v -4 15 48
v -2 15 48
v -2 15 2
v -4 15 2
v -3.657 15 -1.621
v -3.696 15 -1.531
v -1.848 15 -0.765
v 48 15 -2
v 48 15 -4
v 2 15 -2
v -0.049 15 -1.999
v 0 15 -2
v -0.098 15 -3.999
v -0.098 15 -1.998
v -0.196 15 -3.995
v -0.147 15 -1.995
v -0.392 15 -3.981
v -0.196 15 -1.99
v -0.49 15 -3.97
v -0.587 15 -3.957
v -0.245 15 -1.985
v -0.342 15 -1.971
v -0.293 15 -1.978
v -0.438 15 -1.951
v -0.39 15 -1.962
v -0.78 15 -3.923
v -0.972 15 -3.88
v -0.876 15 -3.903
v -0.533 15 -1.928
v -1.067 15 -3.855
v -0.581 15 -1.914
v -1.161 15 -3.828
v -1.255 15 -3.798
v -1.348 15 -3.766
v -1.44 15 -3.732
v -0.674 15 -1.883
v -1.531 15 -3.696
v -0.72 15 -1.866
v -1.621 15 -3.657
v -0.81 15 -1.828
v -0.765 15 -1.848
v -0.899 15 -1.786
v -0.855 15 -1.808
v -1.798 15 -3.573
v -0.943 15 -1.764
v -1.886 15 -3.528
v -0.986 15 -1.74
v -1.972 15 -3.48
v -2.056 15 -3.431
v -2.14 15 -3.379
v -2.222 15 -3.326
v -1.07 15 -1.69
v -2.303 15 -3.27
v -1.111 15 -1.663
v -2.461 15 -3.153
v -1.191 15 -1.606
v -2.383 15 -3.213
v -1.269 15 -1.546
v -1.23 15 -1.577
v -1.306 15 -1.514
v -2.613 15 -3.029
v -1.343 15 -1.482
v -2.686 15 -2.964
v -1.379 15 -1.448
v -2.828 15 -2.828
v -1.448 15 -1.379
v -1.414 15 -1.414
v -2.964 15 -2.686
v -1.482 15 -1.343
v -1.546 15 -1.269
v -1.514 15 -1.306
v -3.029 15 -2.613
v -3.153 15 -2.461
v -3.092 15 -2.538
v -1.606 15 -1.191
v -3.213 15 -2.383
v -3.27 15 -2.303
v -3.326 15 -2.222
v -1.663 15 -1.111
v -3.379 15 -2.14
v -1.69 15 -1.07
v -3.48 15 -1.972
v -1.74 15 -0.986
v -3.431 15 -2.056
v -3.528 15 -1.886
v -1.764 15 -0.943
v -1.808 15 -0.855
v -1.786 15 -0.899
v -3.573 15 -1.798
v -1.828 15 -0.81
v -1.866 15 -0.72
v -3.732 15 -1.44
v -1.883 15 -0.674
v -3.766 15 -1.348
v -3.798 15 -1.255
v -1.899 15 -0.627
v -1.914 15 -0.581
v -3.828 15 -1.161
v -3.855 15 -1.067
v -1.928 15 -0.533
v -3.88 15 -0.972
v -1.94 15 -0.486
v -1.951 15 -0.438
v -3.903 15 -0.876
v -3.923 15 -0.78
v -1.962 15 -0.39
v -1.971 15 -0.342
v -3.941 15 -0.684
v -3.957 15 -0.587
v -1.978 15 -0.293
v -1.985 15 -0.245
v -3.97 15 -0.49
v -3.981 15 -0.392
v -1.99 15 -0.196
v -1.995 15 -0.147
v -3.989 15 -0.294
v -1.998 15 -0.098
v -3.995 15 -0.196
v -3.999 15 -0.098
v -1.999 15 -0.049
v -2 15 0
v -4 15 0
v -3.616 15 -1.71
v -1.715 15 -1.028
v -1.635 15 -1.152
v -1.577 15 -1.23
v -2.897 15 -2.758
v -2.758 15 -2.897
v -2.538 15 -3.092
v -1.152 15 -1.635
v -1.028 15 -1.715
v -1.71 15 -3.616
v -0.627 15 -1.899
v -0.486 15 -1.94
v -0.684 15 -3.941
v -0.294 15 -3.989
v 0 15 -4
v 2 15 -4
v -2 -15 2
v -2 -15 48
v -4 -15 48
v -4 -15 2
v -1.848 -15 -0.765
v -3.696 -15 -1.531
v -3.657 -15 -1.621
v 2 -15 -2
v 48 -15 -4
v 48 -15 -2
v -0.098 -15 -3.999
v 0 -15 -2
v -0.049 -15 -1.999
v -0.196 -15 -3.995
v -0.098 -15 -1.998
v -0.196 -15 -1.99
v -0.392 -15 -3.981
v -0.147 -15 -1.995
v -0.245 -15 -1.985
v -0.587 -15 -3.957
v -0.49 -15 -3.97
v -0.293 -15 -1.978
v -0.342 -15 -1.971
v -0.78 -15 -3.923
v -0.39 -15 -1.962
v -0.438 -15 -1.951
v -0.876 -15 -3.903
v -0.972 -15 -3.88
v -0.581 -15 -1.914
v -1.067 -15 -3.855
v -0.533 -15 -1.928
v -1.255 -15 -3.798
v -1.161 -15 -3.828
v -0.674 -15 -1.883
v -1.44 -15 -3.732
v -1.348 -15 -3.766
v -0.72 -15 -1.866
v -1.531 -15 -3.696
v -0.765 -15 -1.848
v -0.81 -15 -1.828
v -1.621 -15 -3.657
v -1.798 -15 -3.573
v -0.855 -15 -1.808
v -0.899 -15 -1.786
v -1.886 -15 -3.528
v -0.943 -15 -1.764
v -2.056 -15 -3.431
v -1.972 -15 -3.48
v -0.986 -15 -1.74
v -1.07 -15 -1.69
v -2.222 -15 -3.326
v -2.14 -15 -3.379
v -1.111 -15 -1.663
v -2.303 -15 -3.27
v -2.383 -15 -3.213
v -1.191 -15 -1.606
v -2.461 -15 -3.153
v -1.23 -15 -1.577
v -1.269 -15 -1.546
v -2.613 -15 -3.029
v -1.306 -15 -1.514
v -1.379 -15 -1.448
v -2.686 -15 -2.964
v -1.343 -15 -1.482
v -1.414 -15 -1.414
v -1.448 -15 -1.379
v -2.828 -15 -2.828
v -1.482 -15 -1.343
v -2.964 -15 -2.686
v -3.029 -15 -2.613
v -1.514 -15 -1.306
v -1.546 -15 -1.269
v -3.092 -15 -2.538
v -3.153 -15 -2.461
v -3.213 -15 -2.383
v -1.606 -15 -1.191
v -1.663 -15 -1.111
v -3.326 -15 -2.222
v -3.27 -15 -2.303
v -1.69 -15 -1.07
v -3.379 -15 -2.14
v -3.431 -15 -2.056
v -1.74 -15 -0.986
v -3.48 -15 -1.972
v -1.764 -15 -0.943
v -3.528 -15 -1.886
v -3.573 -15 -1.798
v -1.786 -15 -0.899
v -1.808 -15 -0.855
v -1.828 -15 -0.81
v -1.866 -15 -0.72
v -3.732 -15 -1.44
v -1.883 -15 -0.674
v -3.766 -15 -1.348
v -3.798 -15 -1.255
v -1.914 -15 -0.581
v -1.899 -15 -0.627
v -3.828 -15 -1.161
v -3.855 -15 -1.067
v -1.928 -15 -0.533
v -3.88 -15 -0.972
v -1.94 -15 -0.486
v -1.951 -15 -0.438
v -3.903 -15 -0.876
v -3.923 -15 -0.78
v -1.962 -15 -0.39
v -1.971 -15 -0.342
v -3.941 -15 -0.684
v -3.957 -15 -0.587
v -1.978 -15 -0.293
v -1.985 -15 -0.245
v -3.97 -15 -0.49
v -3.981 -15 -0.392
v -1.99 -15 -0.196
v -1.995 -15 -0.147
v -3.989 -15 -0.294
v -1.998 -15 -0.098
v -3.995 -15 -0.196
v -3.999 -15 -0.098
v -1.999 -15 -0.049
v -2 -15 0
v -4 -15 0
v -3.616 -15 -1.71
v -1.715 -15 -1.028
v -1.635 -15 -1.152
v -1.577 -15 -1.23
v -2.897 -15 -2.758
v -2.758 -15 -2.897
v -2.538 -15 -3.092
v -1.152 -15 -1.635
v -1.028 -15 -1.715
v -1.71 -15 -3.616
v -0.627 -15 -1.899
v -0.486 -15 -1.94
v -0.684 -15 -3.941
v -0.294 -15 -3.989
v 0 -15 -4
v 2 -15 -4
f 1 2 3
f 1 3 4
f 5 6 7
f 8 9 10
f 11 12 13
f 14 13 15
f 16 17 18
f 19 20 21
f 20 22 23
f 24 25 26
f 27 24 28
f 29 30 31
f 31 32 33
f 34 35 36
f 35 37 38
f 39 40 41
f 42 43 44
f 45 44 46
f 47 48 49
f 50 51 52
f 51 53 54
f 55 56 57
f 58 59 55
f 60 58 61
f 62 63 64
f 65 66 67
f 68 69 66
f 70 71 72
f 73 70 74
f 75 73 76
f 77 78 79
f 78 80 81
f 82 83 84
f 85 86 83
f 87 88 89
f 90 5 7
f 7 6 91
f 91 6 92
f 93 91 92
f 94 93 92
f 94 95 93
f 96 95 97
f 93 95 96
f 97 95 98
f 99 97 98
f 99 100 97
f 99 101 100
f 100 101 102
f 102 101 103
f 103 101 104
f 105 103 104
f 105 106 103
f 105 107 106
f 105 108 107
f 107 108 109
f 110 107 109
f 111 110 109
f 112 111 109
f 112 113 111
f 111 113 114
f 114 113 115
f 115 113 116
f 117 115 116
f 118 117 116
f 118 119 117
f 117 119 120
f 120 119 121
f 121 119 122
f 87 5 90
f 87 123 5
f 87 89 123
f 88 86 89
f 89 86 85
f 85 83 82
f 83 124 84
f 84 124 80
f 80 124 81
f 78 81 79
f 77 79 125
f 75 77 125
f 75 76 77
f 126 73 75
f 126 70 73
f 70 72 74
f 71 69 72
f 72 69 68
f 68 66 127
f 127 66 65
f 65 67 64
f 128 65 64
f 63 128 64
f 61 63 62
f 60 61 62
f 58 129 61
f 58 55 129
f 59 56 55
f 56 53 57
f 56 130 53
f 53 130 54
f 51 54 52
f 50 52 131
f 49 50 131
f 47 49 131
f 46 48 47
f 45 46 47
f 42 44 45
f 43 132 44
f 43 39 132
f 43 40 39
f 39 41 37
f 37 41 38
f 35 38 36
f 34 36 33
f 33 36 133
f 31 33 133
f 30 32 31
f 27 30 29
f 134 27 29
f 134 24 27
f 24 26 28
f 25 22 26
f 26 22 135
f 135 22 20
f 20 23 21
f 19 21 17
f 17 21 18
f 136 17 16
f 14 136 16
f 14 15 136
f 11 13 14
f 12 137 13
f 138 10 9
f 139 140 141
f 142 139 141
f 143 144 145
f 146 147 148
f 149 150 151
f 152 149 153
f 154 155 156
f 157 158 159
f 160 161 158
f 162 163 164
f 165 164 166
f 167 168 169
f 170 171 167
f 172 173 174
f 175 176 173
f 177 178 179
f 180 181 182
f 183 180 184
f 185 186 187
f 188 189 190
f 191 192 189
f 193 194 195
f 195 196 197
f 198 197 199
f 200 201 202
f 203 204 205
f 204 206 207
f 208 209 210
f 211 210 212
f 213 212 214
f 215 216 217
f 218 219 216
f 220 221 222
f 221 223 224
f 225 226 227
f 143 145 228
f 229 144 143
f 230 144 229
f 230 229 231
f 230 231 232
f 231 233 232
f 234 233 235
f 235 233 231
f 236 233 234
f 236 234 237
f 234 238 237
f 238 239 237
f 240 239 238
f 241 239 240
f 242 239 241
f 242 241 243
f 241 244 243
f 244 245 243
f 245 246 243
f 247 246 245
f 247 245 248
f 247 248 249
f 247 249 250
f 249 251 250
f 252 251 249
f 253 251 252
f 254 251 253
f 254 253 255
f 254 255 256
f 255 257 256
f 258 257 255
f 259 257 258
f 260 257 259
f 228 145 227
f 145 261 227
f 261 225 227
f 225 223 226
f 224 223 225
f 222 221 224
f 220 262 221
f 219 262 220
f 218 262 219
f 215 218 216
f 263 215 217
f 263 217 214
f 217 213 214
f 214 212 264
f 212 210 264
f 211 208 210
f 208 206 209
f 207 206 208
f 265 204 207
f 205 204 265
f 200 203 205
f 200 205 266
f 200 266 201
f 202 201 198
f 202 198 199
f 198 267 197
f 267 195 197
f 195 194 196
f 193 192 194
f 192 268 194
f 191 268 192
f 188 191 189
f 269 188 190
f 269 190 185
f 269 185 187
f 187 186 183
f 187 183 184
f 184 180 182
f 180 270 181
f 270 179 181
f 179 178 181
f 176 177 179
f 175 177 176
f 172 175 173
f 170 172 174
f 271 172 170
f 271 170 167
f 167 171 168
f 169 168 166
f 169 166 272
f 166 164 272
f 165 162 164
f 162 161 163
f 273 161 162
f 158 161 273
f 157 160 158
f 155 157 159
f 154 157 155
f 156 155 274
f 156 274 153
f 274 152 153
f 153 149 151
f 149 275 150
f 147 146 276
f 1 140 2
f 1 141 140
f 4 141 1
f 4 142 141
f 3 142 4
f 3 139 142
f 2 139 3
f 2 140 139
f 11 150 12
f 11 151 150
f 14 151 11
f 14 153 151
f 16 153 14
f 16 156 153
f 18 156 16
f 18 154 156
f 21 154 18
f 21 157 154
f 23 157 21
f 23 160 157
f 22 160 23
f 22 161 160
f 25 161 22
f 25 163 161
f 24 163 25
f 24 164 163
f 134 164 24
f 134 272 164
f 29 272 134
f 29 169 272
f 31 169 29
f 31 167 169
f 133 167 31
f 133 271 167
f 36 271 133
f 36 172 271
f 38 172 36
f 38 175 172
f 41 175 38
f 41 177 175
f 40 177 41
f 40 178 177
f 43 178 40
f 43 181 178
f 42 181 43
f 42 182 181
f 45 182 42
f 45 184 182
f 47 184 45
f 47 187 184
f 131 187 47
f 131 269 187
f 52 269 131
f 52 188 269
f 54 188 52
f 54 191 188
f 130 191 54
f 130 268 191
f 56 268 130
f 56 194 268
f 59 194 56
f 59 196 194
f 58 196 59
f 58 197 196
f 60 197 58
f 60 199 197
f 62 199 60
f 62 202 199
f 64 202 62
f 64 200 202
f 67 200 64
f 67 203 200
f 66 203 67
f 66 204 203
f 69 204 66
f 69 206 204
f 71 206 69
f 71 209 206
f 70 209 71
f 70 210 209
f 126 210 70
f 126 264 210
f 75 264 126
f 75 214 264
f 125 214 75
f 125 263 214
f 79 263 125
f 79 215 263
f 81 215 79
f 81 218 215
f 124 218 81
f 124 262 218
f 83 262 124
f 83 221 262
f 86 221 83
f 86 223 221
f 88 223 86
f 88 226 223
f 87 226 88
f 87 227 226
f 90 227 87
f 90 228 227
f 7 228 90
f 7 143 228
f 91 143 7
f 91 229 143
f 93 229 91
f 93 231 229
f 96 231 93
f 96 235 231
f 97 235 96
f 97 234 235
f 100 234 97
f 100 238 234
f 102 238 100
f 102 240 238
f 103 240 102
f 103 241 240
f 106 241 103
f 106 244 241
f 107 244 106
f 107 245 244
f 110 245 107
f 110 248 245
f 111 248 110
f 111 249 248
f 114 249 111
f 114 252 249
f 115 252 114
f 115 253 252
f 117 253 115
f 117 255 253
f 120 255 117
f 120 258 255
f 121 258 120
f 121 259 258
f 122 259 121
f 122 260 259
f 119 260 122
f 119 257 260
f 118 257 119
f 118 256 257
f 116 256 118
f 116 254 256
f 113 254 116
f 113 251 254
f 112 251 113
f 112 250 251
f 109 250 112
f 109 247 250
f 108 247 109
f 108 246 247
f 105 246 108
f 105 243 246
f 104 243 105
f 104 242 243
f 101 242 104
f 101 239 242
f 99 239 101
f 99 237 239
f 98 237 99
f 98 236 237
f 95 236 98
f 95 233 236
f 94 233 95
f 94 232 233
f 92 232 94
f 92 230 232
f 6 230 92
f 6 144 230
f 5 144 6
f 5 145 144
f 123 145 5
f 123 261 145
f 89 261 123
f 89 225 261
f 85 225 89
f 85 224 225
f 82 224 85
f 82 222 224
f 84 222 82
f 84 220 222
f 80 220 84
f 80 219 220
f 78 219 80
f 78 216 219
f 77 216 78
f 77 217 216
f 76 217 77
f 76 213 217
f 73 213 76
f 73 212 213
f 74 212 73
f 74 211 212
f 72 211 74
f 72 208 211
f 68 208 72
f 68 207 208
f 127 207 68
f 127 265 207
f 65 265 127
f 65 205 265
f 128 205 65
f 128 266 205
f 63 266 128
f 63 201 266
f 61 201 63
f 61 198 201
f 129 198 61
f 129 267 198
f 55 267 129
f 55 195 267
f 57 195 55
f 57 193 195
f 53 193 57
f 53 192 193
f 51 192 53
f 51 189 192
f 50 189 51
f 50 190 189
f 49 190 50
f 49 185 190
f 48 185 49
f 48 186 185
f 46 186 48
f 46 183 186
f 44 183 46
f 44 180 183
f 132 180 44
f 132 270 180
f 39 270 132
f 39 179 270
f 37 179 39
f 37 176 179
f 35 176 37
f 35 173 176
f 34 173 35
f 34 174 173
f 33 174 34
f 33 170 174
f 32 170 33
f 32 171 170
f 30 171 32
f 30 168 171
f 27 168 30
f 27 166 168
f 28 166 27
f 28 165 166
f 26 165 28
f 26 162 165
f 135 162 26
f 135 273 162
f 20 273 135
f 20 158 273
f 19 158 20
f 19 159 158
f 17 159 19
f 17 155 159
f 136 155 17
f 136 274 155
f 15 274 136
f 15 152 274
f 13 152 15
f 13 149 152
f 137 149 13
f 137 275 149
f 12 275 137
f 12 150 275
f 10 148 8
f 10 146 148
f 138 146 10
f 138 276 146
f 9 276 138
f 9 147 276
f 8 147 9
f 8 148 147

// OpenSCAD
// Units: mm
$fn = 96;

thickness_mm = 2.0;
bend_radius_mm = 2.0;
k_factor = 0.45;
bend_angle_deg = 90.0;

outside_flange_a_mm = 50.0;
outside_flange_b_mm = 50.0;
width_mm = 30.0;

bend_allowance_mm =
    (bend_angle_deg * PI / 180.0) * (bend_radius_mm + k_factor * thickness_mm);

outside_setback_mm =
    (bend_radius_mm + thickness_mm) * tan(bend_angle_deg / 2.0);

bend_deduction_mm =
    2.0 * outside_setback_mm - bend_allowance_mm;

developed_flat_length_mm =
    outside_flange_a_mm + outside_flange_b_mm - bend_deduction_mm;

echo(str(
    "MAKERBENCH-SHEETMETAL: {",
    "\"thickness_mm\":", thickness_mm, ",",
    "\"bend_radius_mm\":", bend_radius_mm, ",",
    "\"developed_flat_length_mm\":", developed_flat_length_mm,
    "}"
));

module annular_sector_2d(r_inner, r_outer, a0, a1, steps = 64) {
    outer_pts = [
        for (i = [0 : steps])
            let(a = a0 + (a1 - a0) * i / steps)
            [r_outer * cos(a), r_outer * sin(a)]
    ];

    inner_pts = [
        for (i = [steps : -1 : 0])
            let(a = a0 + (a1 - a0) * i / steps)
            [r_inner * cos(a), r_inner * sin(a)]
    ];

    polygon(concat(outer_pts, inner_pts));
}

module formed_l_bracket() {
    r_i = bend_radius_mm;
    r_o = bend_radius_mm + thickness_mm;

    straight_a_mm = outside_flange_a_mm - r_o;
    straight_b_mm = outside_flange_b_mm - r_o;

    rotate([90, 0, 0])
        linear_extrude(height = width_mm, center = true, convexity = 10)
            union() {
                translate([r_i, -r_o])
                    square([straight_a_mm, thickness_mm], center = false);

                translate([-r_o, r_i])
                    square([thickness_mm, straight_b_mm], center = false);

                annular_sector_2d(r_i, r_o, 180, 270);
            }
}

formed_l_bracket();
